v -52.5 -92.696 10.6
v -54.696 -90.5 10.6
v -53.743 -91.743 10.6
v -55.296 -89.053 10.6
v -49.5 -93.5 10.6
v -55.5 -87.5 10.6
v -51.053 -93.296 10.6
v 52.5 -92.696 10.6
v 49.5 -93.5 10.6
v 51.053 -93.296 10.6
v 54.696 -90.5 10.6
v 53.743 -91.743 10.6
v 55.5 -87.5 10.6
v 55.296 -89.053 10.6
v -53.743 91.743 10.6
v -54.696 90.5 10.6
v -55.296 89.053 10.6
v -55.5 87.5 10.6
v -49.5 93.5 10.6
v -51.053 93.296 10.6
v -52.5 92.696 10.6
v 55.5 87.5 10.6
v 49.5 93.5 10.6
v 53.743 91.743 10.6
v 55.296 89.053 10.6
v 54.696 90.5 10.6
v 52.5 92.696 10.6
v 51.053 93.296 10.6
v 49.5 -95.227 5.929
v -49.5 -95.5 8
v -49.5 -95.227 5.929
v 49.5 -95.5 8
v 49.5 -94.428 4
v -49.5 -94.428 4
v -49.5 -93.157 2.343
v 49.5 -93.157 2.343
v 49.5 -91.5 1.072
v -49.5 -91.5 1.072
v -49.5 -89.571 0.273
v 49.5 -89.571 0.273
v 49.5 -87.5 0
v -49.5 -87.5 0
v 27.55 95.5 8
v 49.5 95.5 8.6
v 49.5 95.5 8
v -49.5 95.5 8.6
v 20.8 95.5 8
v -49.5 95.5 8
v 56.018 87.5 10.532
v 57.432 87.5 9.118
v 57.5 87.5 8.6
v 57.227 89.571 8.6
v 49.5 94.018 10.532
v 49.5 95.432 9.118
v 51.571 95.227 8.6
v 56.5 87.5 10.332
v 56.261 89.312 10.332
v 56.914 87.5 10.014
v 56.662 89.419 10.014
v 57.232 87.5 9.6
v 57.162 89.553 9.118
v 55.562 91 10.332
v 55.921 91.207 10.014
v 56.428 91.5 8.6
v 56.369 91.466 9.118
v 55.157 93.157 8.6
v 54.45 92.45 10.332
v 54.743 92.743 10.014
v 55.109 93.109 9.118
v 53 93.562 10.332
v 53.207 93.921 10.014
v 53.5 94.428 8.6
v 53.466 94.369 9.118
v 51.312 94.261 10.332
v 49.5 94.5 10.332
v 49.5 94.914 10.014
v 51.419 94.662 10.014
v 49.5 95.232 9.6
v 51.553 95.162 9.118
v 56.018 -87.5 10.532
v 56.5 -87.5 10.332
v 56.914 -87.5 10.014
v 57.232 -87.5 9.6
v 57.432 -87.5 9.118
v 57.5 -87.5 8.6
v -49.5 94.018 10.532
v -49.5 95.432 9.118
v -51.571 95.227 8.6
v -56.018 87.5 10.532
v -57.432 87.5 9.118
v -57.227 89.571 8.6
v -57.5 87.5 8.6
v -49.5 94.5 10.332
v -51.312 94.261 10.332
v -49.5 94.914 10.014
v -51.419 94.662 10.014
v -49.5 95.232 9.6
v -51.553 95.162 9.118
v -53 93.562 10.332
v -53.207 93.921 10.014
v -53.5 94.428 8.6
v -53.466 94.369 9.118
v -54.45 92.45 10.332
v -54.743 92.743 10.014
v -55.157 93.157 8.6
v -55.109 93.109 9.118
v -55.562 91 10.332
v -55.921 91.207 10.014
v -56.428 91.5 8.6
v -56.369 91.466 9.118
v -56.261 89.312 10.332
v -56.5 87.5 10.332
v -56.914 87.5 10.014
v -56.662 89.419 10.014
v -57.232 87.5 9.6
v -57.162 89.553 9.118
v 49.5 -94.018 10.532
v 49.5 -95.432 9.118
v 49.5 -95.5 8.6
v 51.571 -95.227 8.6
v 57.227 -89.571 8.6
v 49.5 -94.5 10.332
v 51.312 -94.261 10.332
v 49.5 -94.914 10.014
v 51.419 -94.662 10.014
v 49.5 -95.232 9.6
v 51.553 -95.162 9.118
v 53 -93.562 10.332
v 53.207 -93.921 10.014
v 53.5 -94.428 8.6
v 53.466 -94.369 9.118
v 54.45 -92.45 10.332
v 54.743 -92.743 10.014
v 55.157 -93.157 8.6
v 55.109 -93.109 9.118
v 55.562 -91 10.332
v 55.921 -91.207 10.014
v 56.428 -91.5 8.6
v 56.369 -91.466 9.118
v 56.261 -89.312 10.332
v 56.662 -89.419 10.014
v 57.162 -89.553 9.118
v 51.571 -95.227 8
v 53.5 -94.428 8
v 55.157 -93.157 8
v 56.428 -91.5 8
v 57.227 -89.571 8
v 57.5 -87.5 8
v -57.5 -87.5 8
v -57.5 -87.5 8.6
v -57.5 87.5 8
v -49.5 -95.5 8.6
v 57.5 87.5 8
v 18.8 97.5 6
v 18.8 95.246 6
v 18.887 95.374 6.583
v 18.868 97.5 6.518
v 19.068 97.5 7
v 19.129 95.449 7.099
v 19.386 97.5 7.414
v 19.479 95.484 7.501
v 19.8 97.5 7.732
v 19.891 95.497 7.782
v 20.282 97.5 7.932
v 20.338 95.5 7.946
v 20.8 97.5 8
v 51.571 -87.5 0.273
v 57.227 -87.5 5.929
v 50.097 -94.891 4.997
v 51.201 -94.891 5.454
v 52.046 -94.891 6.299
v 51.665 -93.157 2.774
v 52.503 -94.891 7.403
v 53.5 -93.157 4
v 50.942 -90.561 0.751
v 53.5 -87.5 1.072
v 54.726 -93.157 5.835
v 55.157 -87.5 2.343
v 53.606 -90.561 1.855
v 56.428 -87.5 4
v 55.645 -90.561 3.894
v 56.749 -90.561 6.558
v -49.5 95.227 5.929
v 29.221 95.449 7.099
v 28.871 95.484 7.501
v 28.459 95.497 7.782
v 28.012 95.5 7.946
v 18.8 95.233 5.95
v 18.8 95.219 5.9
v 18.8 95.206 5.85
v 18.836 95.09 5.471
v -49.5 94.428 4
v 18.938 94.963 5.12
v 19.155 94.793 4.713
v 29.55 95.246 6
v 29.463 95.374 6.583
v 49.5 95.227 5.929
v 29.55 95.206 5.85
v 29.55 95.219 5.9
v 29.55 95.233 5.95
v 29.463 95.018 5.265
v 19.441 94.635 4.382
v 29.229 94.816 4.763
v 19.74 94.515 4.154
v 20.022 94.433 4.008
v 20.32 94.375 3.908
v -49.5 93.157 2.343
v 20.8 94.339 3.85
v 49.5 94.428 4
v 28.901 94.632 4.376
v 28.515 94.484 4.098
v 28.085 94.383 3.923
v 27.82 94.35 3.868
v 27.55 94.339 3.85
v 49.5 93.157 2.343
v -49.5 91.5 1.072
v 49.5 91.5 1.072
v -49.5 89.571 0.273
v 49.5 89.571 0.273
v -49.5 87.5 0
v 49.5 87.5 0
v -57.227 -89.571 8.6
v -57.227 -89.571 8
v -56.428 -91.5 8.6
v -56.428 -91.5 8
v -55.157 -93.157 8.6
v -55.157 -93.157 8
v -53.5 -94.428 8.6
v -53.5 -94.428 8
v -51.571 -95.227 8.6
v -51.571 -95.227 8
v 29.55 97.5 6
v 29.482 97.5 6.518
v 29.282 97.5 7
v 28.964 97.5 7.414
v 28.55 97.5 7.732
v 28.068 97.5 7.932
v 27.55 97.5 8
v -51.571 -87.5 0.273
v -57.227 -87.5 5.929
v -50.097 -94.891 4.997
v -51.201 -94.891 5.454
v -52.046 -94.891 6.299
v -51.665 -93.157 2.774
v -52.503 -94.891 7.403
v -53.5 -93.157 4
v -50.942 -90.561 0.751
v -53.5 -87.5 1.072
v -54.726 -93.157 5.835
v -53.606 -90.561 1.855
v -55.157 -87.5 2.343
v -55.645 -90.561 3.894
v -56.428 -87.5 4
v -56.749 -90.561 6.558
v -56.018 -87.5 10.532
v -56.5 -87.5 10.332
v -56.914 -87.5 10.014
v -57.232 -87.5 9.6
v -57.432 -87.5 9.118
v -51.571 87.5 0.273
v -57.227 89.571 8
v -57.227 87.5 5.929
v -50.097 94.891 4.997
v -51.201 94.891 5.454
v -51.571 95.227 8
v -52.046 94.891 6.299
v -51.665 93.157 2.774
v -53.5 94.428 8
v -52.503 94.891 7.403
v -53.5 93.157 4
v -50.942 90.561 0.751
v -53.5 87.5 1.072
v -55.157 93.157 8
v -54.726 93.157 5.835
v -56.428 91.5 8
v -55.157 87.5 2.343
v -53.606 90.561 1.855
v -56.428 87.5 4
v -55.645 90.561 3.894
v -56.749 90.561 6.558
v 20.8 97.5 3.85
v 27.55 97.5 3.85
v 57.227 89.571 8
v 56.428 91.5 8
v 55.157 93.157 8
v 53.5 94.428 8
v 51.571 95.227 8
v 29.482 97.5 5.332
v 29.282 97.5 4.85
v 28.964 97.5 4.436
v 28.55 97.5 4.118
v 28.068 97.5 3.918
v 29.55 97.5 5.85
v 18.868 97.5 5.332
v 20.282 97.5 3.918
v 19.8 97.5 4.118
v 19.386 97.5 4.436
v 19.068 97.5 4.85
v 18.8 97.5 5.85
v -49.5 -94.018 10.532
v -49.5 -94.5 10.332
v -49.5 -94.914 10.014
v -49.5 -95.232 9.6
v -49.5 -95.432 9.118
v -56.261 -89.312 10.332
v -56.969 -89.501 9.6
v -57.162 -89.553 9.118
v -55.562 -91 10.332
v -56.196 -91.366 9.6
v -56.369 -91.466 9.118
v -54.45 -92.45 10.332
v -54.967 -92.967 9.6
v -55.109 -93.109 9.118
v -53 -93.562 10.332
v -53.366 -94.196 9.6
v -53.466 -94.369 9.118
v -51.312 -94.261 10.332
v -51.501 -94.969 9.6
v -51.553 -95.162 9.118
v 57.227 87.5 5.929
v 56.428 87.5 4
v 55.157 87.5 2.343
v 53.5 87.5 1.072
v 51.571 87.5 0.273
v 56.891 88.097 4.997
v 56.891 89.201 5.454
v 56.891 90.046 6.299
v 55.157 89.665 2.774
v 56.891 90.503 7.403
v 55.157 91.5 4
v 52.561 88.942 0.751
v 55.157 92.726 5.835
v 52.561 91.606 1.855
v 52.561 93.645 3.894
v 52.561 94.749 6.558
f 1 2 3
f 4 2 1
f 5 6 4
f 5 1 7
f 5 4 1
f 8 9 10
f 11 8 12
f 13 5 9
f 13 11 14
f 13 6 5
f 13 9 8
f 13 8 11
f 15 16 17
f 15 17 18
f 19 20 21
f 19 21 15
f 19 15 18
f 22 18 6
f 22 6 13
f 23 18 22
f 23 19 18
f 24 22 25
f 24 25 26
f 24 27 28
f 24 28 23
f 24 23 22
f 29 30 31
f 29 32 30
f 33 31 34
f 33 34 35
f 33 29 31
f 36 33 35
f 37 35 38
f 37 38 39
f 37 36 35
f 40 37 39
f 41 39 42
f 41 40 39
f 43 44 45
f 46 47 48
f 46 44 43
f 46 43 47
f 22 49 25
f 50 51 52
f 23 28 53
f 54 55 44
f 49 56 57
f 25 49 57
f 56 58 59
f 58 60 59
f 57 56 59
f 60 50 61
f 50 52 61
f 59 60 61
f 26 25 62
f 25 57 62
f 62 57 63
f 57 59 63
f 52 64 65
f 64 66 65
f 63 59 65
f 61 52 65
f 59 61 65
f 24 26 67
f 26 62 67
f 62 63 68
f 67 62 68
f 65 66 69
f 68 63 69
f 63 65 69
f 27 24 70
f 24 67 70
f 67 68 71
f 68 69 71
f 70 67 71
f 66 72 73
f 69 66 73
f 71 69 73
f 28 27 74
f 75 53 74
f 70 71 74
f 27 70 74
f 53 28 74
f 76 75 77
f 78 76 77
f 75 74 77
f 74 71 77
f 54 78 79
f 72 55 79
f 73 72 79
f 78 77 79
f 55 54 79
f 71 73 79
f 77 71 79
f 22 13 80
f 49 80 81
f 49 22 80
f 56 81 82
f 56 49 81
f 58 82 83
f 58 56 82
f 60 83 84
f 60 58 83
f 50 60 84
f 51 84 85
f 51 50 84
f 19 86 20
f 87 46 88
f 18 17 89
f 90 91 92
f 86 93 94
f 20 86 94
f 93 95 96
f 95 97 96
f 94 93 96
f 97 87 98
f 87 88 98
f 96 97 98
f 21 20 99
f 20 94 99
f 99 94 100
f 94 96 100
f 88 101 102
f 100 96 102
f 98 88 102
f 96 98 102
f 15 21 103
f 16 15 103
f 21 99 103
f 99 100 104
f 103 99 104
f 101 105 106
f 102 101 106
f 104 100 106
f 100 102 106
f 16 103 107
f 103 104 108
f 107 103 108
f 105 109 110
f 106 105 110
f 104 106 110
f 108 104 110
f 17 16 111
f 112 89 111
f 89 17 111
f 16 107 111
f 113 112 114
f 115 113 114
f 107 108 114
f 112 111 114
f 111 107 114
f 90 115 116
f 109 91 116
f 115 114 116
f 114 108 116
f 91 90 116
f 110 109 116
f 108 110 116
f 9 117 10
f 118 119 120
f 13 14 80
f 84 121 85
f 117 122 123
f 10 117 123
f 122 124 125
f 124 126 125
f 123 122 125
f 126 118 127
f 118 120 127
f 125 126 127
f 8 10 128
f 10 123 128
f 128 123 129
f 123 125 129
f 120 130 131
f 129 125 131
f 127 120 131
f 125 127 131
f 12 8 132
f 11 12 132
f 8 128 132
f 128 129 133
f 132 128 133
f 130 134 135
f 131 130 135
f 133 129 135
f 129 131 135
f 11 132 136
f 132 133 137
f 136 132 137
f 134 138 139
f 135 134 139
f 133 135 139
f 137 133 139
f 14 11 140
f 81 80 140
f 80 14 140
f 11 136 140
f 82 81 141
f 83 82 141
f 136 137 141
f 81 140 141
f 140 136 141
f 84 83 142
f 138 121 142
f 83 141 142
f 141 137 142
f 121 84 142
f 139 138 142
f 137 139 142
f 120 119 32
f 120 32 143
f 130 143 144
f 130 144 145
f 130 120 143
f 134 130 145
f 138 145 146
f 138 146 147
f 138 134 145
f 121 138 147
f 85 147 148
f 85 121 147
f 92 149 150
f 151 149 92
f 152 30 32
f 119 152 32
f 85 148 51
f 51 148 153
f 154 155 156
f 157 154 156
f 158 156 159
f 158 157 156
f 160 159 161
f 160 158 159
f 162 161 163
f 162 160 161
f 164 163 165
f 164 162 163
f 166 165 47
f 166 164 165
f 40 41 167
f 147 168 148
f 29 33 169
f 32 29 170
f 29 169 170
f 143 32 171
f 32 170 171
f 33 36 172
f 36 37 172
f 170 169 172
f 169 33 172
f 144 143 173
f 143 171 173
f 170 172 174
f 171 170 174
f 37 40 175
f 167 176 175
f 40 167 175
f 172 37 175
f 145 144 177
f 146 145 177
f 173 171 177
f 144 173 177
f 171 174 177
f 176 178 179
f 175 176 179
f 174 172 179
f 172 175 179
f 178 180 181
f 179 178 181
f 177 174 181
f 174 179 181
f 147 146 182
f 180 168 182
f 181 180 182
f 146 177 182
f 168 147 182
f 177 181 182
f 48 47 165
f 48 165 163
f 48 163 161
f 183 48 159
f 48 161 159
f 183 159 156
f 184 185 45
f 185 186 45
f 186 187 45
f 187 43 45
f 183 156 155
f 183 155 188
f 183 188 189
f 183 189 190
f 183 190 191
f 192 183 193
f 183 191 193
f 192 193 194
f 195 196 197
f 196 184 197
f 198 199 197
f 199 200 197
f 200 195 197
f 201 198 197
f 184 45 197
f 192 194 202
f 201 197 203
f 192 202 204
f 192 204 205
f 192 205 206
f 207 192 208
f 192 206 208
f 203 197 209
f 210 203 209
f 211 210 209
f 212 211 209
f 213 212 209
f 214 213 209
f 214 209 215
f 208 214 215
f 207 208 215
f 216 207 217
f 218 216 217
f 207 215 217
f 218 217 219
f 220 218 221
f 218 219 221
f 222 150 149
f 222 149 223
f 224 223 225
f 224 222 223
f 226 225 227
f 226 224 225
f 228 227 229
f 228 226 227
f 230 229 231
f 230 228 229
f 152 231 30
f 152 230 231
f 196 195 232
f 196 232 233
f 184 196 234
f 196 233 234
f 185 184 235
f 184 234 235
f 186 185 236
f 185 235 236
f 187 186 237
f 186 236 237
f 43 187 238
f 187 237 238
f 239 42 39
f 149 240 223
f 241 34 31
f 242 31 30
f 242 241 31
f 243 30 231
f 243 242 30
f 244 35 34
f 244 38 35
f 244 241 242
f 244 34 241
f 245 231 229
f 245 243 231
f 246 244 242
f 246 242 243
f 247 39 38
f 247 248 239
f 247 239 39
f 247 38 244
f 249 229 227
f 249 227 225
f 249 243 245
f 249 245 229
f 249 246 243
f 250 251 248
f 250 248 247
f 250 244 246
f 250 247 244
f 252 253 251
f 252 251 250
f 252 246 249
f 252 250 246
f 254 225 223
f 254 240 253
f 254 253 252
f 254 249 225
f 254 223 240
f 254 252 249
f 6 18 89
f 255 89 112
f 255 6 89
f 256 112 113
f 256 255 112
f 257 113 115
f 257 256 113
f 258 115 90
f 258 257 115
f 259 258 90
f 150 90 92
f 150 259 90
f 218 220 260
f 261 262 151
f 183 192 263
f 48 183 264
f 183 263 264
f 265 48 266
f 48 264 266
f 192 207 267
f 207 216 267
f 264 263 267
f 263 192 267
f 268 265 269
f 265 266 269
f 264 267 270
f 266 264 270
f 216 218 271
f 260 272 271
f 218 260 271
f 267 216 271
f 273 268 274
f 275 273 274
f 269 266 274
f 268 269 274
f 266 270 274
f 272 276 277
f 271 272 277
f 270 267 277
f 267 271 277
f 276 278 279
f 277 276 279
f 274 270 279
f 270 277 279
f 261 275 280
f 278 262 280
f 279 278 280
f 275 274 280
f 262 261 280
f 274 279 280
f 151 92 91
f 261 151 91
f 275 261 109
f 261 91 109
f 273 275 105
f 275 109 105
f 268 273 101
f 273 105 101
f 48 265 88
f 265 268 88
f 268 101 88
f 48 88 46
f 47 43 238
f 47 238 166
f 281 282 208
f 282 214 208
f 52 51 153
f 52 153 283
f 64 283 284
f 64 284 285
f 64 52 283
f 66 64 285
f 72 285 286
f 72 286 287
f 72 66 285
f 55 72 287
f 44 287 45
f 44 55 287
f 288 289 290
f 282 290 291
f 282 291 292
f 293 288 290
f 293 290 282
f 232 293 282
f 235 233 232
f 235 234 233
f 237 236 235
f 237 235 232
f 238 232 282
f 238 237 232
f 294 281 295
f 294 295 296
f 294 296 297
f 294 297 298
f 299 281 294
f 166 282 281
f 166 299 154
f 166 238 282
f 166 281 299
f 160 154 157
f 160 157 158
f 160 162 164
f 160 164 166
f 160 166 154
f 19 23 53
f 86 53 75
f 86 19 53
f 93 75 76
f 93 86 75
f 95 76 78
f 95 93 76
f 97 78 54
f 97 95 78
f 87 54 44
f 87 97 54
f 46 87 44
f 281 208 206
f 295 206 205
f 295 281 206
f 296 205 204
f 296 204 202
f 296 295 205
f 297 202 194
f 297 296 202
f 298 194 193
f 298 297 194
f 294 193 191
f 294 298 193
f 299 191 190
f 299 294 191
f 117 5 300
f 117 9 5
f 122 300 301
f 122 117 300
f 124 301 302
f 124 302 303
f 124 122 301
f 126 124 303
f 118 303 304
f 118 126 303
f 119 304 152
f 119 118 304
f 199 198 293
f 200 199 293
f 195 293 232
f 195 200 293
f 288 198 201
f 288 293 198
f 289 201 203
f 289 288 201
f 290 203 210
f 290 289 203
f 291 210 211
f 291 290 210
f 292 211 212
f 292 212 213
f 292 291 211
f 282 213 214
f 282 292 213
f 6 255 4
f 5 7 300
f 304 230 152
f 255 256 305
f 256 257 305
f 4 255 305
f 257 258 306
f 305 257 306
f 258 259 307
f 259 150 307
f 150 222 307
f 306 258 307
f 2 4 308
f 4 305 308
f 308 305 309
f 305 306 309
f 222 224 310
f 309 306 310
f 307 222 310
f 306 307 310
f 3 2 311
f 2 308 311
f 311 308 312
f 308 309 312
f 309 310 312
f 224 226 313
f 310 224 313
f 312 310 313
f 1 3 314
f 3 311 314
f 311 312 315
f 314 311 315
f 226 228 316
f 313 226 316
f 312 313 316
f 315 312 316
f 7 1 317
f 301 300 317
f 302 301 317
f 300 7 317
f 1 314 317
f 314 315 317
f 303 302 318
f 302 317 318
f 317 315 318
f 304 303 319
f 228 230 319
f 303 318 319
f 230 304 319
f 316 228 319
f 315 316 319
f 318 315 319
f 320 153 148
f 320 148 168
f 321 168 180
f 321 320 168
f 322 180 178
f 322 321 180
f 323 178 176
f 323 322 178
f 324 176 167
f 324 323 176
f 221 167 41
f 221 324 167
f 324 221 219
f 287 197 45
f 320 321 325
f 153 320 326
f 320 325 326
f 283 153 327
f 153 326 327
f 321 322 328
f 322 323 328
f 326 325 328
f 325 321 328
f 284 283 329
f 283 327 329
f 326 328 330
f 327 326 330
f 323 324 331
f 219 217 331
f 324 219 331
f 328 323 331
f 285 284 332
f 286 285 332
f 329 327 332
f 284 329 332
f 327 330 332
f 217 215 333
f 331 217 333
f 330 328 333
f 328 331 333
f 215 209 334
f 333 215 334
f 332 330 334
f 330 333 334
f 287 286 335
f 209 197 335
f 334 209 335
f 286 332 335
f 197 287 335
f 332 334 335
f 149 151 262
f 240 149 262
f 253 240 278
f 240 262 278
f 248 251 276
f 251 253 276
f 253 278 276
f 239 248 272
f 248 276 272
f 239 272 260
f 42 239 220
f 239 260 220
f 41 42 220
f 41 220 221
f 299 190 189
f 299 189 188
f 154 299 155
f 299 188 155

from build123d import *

# Parameters (mm, degrees)
F0_W     = 115
F0_H     = 191
F1_DEPTH = 10.6
F2_R     = 8
F3_R     = 2
F4_W     = 10.75
F4_H     = 4.15
F5_DEPTH = 2
F6_DEPTH = 2
F7_R     = 2


with BuildPart() as f1:
    # F0 (on Top) → F1 (new body)
    with BuildSketch(Plane.XY):
        Rectangle(F0_W, F0_H)
    extrude(amount=F1_DEPTH)

    # F2
    f2_edges = [f1.edges().sort_by_distance(p)[0] for p in [
        (-57.5, 0, 0),
        (0, 95.5, 0),
        (57.5, 0, 0),
        (0, -95.5, 0),
        (-57.5, 95.5, 5.3),
        (57.5, 95.5, 5.3),
        (57.5, -95.5, 5.3),
        (-57.5, -95.5, 5.3),
    ]]
    fillet(f2_edges, radius=F2_R)

    # F3
    f3_edges = [f1.edges().sort_by_distance(p)[0] for p in [
        (0, -95.5, 10.6),
    ]]
    fillet(f3_edges, radius=F3_R)

    # F4 (on face) → F5 (join)
    with BuildSketch(Plane(origin=(0, 95.5, 0), x_dir=(-1, 0, 0), z_dir=(0, 1, 0))):
        with Locations((-24.175, 5.925)):
            Rectangle(F4_W, F4_H)
    extrude(amount=-F5_DEPTH)

    # F4 (on face) → F6 (join)
    with BuildSketch(Plane(origin=(0, 95.5, 0), x_dir=(-1, 0, 0), z_dir=(0, 1, 0))):
        with Locations((-24.175, 5.925)):
            Rectangle(F4_W, F4_H)
    extrude(amount=F6_DEPTH)

    # F7
    f7_edges = [f1.edges().sort_by_distance(p)[0] for p in [
        (18.8, 96.5, 8),
        (18.8, 95.919704, 3.85),
        (29.55, 95.919704, 3.85),
        (29.55, 96.5, 8),
    ]]
    fillet(f7_edges, radius=F7_R)


solid = f1.part
